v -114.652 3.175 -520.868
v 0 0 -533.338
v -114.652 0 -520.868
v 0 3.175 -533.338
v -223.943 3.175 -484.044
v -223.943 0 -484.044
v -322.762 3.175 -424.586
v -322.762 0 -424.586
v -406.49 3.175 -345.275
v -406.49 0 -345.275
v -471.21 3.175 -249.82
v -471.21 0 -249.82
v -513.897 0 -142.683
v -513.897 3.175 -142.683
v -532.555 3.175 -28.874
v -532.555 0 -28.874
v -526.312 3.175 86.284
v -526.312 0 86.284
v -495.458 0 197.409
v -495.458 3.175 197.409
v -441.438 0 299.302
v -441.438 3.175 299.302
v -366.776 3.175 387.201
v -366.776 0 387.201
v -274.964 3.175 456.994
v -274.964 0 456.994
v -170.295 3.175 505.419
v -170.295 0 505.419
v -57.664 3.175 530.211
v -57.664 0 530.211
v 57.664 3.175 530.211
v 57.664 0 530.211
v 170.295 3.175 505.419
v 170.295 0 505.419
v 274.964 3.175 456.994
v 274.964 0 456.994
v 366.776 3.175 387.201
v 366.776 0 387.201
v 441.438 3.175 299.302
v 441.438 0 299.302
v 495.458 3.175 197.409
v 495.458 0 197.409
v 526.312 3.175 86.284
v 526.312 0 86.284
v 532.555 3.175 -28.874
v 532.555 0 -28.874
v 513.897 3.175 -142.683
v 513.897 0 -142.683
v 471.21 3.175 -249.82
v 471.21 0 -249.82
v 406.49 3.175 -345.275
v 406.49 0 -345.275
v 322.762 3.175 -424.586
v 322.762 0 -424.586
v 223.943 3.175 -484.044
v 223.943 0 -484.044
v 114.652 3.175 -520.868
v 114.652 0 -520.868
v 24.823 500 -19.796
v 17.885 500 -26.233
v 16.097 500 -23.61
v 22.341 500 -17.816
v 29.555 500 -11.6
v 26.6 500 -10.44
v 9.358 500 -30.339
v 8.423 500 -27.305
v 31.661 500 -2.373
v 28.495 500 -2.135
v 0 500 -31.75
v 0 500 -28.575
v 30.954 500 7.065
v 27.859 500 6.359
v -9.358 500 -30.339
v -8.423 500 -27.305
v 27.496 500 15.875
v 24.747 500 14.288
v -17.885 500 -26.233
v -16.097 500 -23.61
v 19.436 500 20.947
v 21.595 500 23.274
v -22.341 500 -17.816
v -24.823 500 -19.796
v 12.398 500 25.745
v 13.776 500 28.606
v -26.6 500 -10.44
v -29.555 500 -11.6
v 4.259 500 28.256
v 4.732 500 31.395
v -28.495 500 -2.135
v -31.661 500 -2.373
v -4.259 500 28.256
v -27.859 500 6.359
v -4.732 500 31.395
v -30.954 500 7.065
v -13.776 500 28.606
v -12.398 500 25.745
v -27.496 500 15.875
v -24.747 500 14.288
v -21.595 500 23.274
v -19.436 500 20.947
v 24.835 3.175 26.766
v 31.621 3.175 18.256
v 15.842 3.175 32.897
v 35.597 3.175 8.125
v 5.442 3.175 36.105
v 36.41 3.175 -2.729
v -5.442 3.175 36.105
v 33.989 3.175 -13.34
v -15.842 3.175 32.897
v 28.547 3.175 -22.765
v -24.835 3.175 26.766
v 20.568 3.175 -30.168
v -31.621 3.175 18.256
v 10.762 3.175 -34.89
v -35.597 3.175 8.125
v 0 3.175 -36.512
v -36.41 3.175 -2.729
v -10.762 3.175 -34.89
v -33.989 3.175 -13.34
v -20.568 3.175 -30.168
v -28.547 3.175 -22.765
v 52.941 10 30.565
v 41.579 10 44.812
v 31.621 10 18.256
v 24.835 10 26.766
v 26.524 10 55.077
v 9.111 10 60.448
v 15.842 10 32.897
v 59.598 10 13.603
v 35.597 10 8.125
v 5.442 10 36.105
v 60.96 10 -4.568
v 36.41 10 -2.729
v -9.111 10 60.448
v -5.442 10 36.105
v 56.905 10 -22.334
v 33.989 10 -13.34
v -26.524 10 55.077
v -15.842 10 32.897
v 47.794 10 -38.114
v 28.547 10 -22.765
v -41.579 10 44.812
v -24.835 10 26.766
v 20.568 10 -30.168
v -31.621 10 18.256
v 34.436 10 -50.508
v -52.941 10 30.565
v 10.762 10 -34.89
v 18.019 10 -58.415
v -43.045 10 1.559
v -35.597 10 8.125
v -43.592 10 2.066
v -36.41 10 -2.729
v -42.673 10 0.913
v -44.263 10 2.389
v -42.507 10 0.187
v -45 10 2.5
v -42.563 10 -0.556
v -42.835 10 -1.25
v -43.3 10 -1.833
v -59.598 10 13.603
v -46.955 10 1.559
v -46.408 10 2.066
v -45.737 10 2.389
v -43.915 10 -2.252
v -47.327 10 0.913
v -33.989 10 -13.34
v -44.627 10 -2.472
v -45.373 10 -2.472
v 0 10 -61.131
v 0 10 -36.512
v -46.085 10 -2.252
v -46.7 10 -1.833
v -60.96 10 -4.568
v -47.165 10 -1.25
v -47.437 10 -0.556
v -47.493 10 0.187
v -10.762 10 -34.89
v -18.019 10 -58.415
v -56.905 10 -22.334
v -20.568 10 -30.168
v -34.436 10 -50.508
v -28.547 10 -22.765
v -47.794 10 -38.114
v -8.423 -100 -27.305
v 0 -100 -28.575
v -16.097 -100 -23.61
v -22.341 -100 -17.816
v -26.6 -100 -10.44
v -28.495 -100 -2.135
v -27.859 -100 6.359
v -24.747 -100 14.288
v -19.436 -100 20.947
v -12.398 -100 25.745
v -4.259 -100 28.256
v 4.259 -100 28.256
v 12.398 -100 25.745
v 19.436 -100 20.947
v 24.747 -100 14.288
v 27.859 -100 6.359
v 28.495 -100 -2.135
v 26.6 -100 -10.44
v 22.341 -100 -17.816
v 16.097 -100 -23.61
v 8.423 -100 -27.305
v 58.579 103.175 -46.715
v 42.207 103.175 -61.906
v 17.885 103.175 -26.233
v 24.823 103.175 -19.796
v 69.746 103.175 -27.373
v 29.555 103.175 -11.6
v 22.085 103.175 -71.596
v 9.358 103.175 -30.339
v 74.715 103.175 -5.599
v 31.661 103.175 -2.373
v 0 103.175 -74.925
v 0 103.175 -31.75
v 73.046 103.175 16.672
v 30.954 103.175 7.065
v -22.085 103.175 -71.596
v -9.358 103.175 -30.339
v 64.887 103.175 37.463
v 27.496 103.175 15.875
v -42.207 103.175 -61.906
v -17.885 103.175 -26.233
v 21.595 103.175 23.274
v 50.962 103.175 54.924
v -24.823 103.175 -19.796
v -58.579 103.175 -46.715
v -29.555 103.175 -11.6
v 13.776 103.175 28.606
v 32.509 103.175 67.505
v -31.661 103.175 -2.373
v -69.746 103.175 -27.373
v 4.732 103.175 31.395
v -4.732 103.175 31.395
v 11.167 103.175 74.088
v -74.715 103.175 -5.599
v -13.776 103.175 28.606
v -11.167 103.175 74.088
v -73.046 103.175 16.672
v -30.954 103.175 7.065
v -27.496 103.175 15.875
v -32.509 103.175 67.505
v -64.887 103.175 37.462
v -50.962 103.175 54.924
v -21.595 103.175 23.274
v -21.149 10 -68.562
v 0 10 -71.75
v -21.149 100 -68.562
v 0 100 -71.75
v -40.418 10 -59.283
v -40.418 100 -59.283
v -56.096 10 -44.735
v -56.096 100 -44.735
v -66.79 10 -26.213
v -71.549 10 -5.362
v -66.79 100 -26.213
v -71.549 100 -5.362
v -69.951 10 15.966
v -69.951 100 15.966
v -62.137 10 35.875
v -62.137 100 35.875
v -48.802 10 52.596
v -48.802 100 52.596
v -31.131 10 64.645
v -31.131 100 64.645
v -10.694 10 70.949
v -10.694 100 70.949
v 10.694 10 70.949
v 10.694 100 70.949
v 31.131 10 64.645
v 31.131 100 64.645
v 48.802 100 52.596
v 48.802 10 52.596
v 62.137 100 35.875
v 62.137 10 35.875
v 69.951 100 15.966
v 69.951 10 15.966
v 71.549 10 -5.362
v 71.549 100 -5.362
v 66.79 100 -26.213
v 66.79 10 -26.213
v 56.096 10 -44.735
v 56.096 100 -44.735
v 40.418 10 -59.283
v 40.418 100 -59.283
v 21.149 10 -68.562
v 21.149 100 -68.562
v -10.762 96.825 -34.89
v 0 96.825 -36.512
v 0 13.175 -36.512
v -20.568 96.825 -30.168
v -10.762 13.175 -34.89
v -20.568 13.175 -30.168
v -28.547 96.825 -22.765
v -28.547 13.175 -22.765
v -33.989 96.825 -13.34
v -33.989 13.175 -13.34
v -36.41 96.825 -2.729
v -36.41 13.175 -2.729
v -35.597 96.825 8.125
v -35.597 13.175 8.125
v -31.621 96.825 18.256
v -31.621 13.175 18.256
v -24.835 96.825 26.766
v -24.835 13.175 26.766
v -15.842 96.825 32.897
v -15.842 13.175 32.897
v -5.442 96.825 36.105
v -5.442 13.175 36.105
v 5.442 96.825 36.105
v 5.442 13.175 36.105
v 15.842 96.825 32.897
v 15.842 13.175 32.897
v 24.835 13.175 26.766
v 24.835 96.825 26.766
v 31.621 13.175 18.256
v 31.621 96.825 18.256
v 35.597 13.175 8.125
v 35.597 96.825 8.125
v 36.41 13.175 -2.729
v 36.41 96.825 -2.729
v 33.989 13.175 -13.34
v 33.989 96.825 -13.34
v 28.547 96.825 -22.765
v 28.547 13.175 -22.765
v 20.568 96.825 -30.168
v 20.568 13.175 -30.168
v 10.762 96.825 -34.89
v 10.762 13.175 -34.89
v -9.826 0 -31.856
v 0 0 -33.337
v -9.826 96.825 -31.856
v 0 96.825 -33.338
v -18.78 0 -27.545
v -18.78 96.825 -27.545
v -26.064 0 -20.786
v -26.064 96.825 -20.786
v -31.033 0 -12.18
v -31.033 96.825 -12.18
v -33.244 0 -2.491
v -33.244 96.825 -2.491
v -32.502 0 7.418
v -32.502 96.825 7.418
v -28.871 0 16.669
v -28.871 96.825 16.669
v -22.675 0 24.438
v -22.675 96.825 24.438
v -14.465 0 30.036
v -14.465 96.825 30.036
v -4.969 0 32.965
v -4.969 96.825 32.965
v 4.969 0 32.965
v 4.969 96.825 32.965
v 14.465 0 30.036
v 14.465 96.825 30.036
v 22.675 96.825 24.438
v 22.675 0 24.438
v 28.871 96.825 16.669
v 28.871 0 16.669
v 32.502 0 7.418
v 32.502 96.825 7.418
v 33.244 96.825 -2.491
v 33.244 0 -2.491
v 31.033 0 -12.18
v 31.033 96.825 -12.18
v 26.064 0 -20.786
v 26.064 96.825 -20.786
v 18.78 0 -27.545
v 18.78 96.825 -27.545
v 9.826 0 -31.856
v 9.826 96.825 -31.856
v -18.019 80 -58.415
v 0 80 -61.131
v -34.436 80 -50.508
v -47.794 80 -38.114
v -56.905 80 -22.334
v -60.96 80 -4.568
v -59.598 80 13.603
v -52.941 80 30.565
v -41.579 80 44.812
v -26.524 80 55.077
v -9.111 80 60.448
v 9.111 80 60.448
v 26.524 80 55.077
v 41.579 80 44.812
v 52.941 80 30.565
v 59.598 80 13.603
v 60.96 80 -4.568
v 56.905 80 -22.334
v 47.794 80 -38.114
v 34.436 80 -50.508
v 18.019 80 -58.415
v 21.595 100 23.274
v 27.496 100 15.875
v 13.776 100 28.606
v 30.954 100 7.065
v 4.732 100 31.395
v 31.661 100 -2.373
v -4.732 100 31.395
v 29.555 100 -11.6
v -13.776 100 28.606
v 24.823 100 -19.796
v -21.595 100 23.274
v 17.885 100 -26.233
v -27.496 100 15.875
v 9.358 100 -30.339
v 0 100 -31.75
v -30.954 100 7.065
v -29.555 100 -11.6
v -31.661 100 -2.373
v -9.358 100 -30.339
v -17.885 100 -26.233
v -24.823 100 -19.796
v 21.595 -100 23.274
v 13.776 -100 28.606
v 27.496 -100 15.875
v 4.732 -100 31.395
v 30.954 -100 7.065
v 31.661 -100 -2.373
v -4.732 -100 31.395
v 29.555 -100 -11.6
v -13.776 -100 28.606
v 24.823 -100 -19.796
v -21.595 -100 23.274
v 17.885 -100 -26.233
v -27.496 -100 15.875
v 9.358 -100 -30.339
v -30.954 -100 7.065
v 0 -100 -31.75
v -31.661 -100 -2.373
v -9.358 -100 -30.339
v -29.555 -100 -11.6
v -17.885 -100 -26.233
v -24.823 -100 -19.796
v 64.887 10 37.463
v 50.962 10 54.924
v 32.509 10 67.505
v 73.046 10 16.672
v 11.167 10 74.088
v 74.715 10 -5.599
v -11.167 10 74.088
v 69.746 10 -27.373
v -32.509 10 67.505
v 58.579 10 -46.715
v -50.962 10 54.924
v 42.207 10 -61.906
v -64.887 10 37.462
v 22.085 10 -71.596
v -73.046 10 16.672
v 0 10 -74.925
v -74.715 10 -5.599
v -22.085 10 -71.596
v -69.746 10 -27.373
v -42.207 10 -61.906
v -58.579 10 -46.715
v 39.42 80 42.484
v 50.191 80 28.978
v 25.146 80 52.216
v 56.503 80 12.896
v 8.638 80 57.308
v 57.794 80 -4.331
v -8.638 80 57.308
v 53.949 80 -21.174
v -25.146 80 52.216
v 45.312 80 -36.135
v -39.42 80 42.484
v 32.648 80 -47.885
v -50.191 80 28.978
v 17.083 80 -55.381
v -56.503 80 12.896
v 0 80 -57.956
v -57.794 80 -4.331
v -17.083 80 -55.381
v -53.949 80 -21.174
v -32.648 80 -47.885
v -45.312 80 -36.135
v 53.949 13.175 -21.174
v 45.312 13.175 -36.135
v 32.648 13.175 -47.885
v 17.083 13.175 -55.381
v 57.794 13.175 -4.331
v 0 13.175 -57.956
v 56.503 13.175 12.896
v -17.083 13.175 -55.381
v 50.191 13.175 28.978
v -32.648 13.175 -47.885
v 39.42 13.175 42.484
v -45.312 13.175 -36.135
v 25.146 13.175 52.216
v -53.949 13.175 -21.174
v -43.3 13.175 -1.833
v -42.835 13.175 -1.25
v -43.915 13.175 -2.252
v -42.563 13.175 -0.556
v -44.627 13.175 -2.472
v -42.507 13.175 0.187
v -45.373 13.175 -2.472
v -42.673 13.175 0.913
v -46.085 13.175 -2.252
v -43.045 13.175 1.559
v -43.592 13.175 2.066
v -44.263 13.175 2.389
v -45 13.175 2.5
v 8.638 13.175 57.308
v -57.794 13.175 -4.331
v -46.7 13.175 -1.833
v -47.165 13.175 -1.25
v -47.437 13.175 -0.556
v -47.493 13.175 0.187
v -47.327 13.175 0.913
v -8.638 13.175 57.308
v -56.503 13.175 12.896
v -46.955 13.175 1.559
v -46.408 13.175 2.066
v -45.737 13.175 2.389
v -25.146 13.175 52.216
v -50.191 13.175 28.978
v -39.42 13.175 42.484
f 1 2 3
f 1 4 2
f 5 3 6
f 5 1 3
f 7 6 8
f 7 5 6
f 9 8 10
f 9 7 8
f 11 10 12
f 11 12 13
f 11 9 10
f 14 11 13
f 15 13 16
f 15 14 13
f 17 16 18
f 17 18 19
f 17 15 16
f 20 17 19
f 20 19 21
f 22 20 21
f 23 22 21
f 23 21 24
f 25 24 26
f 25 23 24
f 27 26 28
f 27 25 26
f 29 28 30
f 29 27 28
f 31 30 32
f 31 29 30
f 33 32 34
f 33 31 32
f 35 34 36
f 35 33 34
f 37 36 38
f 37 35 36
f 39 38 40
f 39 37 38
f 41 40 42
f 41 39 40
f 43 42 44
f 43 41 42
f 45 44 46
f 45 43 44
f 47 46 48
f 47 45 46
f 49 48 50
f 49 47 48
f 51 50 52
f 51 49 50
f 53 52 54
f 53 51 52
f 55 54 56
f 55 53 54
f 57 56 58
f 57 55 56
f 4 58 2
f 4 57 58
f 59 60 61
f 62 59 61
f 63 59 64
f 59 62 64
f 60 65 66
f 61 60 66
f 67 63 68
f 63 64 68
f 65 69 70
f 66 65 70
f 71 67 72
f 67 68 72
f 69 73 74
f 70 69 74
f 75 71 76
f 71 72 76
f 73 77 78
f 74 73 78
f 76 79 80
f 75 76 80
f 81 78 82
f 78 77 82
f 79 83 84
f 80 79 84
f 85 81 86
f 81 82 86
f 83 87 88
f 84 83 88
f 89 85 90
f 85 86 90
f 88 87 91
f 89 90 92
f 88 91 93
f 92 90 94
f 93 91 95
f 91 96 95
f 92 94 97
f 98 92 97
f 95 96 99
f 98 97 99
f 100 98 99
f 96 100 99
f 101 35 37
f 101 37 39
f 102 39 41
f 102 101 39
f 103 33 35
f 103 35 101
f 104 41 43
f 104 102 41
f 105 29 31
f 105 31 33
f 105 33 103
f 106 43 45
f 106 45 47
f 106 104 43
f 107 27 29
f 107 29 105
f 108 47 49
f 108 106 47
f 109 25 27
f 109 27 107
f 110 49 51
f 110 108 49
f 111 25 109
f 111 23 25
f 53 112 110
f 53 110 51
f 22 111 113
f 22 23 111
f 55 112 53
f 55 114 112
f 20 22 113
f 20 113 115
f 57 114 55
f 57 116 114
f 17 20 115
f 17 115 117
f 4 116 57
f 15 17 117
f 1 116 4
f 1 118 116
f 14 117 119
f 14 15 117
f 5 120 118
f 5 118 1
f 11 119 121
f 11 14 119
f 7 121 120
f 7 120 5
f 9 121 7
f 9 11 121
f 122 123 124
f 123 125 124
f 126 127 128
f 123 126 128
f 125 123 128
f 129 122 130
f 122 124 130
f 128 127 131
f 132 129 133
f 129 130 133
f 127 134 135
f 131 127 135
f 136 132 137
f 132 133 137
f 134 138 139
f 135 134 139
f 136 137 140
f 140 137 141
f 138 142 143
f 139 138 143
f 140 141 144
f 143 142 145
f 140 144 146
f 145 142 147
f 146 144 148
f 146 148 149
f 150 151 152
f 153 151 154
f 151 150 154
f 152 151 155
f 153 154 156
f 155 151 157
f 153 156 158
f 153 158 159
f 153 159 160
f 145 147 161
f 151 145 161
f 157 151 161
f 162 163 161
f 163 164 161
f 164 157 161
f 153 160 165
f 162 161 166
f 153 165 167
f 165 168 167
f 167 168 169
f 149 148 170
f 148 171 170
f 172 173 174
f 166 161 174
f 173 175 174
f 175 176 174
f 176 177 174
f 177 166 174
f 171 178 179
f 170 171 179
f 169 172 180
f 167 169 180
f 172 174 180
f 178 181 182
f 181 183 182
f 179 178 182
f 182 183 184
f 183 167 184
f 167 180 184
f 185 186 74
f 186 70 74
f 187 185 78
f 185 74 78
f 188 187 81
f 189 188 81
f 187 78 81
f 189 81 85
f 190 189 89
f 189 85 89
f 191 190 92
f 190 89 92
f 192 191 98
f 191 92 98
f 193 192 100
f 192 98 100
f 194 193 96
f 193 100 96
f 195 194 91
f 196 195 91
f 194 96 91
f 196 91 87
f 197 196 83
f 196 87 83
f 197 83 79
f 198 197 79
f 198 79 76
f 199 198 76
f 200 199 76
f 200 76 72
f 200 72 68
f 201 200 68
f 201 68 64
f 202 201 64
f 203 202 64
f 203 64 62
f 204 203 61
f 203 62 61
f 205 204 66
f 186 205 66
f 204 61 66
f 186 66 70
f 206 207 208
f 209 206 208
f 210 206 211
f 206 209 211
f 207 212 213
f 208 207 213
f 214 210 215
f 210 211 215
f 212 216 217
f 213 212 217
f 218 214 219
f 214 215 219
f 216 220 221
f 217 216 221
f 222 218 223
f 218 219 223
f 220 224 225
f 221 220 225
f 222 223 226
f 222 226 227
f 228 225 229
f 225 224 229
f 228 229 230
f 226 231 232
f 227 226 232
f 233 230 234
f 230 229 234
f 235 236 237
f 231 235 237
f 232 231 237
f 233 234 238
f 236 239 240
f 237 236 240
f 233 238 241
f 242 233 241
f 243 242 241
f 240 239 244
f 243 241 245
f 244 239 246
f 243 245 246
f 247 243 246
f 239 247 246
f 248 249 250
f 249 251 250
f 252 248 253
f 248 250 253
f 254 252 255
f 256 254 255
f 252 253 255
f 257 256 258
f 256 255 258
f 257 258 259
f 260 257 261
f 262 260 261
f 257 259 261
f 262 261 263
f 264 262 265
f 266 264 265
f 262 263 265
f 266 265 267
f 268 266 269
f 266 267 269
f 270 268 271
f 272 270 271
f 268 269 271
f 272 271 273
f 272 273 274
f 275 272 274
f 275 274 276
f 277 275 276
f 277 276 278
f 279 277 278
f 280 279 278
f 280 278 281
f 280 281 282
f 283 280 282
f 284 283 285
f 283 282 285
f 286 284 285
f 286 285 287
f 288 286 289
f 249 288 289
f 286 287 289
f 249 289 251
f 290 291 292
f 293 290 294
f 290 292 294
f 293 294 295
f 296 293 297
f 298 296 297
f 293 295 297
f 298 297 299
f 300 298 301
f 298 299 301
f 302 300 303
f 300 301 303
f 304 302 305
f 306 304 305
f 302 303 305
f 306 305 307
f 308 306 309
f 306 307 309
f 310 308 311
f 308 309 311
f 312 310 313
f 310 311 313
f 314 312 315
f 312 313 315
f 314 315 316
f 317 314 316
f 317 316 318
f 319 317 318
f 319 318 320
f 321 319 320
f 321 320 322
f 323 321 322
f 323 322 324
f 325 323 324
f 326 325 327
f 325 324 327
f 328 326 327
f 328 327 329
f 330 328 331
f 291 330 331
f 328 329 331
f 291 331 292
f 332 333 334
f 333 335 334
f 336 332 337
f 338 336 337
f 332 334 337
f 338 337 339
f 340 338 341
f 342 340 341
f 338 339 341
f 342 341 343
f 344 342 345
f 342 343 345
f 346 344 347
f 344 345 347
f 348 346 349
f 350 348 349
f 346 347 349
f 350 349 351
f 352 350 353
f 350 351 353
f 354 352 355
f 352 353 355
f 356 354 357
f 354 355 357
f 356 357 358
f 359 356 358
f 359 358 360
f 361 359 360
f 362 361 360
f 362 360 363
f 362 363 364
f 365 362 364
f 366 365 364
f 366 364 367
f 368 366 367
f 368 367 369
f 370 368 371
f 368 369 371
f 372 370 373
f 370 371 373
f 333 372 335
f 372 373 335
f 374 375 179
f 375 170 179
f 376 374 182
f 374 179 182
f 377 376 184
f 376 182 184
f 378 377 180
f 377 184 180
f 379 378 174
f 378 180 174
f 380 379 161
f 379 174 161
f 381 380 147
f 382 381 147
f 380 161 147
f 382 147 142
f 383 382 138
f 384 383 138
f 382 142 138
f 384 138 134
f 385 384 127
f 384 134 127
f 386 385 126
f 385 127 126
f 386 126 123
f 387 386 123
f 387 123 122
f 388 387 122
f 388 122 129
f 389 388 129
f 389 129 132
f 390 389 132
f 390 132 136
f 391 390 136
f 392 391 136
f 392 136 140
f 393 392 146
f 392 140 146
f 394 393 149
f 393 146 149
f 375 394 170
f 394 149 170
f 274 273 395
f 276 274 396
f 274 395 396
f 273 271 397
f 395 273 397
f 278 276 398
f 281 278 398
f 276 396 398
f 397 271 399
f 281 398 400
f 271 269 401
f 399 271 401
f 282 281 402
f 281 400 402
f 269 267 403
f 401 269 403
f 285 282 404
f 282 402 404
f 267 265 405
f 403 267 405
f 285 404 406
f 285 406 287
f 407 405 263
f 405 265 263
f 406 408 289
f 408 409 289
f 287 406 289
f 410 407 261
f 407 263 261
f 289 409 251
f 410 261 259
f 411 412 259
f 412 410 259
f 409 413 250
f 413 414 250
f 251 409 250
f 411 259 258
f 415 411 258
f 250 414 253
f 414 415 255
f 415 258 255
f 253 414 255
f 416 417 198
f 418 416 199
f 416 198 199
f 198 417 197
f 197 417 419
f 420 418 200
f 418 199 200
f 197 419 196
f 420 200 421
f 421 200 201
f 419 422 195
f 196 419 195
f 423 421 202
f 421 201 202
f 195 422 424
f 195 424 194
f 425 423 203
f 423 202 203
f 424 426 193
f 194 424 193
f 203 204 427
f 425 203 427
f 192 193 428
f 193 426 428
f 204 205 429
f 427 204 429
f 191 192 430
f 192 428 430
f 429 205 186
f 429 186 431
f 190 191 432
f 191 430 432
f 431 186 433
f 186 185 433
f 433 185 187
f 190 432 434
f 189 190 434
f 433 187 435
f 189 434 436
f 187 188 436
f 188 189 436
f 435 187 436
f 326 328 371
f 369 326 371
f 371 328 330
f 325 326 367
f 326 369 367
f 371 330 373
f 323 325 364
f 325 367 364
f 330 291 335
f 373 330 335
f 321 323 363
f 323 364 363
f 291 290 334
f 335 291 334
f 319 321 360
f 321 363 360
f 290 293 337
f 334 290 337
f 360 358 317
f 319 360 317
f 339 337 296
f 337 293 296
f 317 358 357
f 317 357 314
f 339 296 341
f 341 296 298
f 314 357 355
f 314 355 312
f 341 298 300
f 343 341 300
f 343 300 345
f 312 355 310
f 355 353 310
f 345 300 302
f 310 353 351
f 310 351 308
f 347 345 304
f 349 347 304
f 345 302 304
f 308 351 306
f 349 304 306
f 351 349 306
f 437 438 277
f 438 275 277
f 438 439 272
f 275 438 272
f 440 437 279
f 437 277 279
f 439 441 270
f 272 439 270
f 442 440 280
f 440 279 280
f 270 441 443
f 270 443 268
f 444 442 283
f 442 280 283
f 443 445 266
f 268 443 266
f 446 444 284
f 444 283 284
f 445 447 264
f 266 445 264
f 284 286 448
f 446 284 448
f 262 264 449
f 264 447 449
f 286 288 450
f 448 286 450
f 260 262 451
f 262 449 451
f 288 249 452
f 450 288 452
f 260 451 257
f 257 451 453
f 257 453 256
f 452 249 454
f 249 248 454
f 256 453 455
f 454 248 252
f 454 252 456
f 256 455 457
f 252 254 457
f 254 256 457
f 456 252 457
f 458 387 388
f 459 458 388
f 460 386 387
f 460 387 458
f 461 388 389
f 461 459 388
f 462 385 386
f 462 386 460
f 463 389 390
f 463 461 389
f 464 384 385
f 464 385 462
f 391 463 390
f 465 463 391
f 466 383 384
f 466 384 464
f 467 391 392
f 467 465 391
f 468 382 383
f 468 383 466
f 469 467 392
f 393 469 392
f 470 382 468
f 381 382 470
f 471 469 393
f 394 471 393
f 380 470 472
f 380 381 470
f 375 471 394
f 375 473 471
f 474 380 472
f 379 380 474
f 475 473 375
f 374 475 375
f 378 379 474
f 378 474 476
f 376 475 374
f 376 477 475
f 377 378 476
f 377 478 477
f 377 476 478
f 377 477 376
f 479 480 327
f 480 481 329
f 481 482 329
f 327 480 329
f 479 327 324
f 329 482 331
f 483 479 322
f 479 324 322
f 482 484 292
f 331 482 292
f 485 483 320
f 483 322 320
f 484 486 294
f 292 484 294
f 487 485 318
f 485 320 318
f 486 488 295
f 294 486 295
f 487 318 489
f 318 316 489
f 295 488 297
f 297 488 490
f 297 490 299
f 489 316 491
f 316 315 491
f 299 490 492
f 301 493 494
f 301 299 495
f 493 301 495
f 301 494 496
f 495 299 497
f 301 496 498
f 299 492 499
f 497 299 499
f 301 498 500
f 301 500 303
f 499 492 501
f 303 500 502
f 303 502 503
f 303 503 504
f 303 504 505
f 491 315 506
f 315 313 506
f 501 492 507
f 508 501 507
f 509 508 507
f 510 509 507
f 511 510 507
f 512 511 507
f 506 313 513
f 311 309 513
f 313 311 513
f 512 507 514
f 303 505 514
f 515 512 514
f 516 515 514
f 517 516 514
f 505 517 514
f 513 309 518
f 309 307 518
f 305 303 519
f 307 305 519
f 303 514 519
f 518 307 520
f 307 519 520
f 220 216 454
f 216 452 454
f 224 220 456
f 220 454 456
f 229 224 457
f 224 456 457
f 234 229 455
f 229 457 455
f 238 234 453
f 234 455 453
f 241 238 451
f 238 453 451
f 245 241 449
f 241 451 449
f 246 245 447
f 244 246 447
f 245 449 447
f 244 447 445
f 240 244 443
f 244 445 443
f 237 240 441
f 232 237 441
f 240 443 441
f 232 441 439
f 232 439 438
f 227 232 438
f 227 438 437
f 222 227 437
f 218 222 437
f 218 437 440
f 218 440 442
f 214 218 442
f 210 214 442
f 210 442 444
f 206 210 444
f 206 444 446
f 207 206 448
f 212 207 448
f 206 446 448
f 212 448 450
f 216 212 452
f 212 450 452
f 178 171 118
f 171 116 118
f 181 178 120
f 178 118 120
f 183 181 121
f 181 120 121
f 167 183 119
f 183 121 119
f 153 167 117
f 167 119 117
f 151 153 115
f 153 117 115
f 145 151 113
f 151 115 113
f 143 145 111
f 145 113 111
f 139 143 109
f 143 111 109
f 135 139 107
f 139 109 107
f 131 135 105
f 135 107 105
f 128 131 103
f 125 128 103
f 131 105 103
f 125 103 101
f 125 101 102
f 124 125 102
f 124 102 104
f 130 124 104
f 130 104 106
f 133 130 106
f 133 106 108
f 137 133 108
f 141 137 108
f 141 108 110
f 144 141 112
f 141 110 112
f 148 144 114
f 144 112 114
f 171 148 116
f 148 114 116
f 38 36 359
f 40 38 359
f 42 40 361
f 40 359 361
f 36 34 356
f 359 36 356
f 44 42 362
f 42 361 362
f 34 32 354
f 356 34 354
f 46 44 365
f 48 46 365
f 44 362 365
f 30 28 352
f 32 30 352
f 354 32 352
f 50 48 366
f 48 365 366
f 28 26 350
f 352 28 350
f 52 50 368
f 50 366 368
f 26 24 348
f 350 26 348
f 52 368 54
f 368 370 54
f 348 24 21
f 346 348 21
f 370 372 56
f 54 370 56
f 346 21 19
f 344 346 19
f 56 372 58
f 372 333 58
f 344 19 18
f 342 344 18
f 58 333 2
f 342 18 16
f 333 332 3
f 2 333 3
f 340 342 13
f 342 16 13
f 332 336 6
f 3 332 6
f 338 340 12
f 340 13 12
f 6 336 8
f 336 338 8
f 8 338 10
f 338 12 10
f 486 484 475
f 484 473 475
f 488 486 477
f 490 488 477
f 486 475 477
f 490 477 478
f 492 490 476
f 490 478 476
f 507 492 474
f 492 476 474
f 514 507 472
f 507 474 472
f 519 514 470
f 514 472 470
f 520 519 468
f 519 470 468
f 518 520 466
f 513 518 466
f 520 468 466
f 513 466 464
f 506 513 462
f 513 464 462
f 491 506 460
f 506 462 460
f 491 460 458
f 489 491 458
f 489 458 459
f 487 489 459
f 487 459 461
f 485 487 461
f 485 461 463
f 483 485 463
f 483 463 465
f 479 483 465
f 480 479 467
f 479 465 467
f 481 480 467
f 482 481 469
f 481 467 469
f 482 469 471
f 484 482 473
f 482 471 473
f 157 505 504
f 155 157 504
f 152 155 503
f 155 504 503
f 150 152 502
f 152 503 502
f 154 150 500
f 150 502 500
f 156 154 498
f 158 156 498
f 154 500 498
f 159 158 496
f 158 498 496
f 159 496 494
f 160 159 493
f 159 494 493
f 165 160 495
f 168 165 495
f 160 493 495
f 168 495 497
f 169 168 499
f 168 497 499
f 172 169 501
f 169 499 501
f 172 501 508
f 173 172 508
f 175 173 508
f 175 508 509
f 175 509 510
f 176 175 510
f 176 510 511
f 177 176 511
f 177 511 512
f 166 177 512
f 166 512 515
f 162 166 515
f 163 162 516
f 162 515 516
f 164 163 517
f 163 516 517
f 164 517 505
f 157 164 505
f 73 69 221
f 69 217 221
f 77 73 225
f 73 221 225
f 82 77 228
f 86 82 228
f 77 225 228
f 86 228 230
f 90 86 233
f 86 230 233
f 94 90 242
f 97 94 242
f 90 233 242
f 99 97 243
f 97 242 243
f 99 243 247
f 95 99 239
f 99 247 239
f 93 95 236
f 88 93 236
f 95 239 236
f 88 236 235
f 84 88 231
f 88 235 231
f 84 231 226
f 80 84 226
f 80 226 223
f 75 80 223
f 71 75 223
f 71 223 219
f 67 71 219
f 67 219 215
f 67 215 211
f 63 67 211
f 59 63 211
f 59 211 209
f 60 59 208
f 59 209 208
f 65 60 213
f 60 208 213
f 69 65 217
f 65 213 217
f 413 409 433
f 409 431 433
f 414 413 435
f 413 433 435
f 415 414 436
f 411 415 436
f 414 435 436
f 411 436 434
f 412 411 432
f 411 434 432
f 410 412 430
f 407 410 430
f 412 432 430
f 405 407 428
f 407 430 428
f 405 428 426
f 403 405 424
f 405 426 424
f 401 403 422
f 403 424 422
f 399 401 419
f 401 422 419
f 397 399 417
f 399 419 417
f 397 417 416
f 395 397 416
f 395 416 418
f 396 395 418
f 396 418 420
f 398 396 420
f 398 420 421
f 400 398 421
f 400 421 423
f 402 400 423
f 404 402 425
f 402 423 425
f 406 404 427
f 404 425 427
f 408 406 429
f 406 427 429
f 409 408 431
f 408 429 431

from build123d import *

# Parameters (mm, degrees)
SKETCH6_W          = 500
SKETCH6_H          = 3.175
SKETCH6_W_2        = 3.175
SKETCH6_H_2        = 66.825
SKETCH8_R          = 2.5
CUT_EXTRUDE1_DEPTH = 3.175


with BuildPart() as part:
    # Sketch2 → Revolve1 (revolve)
    with BuildSketch(Plane.XY, mode=Mode.PRIVATE) as revolve1_sk:
        Polygon((-28.575, 500), (-31.75, 500), (-31.75, 103.175), (-74.925, 103.175), (-74.925, 10), (-71.75, 10), (-71.75, 100), (-31.75, 100), (-31.75, -100), (-28.575, -100), align=None)
    revolve(revolve1_sk.sketch.rotate(Axis((0, 0, 0), (0, 1, 0)), 270), axis=Axis((0, 0, 0), (0, 1, 0)))


with BuildPart() as body_2:
    # Sketch6 → Revolve2 (revolve)
    with BuildSketch(Plane.XY, mode=Mode.PRIVATE) as revolve2_sk:
        with Locations((-283.3375, 1.5875)):
            Rectangle(SKETCH6_W, SKETCH6_H)
        Polygon((-36.5125, 3.175), (-33.3375, 3.175), (-33.3375, 96.825), (-36.5125, 96.825), (-36.5125, 13.175), (-36.5125, 10), align=None)
        Polygon((-61.130631236, 10), (-36.5125, 10), (-36.5125, 13.175), (-57.955631236, 13.175), (-61.130631236, 13.175), align=None)
        with Locations((-59.543131236, 46.5875)):
            Rectangle(SKETCH6_W_2, SKETCH6_H_2)
    revolve(revolve2_sk.sketch.rotate(Axis((0, 0, 0), (0, 1, 0)), 270), axis=Axis((0, 0, 0), (0, 1, 0)))

    # Sketch8 → Cut-Extrude1 (cut)
    with BuildSketch(Plane(origin=(0, 13.175, 0), x_dir=(1, 0, 0), z_dir=(0, 1, 0))):
        with Locations(Location((-45, 0, 0), (0, 0, 270))):
            Circle(SKETCH8_R)
    extrude(amount=-CUT_EXTRUDE1_DEPTH, mode=Mode.SUBTRACT)


solid = Compound([part.part, body_2.part])
